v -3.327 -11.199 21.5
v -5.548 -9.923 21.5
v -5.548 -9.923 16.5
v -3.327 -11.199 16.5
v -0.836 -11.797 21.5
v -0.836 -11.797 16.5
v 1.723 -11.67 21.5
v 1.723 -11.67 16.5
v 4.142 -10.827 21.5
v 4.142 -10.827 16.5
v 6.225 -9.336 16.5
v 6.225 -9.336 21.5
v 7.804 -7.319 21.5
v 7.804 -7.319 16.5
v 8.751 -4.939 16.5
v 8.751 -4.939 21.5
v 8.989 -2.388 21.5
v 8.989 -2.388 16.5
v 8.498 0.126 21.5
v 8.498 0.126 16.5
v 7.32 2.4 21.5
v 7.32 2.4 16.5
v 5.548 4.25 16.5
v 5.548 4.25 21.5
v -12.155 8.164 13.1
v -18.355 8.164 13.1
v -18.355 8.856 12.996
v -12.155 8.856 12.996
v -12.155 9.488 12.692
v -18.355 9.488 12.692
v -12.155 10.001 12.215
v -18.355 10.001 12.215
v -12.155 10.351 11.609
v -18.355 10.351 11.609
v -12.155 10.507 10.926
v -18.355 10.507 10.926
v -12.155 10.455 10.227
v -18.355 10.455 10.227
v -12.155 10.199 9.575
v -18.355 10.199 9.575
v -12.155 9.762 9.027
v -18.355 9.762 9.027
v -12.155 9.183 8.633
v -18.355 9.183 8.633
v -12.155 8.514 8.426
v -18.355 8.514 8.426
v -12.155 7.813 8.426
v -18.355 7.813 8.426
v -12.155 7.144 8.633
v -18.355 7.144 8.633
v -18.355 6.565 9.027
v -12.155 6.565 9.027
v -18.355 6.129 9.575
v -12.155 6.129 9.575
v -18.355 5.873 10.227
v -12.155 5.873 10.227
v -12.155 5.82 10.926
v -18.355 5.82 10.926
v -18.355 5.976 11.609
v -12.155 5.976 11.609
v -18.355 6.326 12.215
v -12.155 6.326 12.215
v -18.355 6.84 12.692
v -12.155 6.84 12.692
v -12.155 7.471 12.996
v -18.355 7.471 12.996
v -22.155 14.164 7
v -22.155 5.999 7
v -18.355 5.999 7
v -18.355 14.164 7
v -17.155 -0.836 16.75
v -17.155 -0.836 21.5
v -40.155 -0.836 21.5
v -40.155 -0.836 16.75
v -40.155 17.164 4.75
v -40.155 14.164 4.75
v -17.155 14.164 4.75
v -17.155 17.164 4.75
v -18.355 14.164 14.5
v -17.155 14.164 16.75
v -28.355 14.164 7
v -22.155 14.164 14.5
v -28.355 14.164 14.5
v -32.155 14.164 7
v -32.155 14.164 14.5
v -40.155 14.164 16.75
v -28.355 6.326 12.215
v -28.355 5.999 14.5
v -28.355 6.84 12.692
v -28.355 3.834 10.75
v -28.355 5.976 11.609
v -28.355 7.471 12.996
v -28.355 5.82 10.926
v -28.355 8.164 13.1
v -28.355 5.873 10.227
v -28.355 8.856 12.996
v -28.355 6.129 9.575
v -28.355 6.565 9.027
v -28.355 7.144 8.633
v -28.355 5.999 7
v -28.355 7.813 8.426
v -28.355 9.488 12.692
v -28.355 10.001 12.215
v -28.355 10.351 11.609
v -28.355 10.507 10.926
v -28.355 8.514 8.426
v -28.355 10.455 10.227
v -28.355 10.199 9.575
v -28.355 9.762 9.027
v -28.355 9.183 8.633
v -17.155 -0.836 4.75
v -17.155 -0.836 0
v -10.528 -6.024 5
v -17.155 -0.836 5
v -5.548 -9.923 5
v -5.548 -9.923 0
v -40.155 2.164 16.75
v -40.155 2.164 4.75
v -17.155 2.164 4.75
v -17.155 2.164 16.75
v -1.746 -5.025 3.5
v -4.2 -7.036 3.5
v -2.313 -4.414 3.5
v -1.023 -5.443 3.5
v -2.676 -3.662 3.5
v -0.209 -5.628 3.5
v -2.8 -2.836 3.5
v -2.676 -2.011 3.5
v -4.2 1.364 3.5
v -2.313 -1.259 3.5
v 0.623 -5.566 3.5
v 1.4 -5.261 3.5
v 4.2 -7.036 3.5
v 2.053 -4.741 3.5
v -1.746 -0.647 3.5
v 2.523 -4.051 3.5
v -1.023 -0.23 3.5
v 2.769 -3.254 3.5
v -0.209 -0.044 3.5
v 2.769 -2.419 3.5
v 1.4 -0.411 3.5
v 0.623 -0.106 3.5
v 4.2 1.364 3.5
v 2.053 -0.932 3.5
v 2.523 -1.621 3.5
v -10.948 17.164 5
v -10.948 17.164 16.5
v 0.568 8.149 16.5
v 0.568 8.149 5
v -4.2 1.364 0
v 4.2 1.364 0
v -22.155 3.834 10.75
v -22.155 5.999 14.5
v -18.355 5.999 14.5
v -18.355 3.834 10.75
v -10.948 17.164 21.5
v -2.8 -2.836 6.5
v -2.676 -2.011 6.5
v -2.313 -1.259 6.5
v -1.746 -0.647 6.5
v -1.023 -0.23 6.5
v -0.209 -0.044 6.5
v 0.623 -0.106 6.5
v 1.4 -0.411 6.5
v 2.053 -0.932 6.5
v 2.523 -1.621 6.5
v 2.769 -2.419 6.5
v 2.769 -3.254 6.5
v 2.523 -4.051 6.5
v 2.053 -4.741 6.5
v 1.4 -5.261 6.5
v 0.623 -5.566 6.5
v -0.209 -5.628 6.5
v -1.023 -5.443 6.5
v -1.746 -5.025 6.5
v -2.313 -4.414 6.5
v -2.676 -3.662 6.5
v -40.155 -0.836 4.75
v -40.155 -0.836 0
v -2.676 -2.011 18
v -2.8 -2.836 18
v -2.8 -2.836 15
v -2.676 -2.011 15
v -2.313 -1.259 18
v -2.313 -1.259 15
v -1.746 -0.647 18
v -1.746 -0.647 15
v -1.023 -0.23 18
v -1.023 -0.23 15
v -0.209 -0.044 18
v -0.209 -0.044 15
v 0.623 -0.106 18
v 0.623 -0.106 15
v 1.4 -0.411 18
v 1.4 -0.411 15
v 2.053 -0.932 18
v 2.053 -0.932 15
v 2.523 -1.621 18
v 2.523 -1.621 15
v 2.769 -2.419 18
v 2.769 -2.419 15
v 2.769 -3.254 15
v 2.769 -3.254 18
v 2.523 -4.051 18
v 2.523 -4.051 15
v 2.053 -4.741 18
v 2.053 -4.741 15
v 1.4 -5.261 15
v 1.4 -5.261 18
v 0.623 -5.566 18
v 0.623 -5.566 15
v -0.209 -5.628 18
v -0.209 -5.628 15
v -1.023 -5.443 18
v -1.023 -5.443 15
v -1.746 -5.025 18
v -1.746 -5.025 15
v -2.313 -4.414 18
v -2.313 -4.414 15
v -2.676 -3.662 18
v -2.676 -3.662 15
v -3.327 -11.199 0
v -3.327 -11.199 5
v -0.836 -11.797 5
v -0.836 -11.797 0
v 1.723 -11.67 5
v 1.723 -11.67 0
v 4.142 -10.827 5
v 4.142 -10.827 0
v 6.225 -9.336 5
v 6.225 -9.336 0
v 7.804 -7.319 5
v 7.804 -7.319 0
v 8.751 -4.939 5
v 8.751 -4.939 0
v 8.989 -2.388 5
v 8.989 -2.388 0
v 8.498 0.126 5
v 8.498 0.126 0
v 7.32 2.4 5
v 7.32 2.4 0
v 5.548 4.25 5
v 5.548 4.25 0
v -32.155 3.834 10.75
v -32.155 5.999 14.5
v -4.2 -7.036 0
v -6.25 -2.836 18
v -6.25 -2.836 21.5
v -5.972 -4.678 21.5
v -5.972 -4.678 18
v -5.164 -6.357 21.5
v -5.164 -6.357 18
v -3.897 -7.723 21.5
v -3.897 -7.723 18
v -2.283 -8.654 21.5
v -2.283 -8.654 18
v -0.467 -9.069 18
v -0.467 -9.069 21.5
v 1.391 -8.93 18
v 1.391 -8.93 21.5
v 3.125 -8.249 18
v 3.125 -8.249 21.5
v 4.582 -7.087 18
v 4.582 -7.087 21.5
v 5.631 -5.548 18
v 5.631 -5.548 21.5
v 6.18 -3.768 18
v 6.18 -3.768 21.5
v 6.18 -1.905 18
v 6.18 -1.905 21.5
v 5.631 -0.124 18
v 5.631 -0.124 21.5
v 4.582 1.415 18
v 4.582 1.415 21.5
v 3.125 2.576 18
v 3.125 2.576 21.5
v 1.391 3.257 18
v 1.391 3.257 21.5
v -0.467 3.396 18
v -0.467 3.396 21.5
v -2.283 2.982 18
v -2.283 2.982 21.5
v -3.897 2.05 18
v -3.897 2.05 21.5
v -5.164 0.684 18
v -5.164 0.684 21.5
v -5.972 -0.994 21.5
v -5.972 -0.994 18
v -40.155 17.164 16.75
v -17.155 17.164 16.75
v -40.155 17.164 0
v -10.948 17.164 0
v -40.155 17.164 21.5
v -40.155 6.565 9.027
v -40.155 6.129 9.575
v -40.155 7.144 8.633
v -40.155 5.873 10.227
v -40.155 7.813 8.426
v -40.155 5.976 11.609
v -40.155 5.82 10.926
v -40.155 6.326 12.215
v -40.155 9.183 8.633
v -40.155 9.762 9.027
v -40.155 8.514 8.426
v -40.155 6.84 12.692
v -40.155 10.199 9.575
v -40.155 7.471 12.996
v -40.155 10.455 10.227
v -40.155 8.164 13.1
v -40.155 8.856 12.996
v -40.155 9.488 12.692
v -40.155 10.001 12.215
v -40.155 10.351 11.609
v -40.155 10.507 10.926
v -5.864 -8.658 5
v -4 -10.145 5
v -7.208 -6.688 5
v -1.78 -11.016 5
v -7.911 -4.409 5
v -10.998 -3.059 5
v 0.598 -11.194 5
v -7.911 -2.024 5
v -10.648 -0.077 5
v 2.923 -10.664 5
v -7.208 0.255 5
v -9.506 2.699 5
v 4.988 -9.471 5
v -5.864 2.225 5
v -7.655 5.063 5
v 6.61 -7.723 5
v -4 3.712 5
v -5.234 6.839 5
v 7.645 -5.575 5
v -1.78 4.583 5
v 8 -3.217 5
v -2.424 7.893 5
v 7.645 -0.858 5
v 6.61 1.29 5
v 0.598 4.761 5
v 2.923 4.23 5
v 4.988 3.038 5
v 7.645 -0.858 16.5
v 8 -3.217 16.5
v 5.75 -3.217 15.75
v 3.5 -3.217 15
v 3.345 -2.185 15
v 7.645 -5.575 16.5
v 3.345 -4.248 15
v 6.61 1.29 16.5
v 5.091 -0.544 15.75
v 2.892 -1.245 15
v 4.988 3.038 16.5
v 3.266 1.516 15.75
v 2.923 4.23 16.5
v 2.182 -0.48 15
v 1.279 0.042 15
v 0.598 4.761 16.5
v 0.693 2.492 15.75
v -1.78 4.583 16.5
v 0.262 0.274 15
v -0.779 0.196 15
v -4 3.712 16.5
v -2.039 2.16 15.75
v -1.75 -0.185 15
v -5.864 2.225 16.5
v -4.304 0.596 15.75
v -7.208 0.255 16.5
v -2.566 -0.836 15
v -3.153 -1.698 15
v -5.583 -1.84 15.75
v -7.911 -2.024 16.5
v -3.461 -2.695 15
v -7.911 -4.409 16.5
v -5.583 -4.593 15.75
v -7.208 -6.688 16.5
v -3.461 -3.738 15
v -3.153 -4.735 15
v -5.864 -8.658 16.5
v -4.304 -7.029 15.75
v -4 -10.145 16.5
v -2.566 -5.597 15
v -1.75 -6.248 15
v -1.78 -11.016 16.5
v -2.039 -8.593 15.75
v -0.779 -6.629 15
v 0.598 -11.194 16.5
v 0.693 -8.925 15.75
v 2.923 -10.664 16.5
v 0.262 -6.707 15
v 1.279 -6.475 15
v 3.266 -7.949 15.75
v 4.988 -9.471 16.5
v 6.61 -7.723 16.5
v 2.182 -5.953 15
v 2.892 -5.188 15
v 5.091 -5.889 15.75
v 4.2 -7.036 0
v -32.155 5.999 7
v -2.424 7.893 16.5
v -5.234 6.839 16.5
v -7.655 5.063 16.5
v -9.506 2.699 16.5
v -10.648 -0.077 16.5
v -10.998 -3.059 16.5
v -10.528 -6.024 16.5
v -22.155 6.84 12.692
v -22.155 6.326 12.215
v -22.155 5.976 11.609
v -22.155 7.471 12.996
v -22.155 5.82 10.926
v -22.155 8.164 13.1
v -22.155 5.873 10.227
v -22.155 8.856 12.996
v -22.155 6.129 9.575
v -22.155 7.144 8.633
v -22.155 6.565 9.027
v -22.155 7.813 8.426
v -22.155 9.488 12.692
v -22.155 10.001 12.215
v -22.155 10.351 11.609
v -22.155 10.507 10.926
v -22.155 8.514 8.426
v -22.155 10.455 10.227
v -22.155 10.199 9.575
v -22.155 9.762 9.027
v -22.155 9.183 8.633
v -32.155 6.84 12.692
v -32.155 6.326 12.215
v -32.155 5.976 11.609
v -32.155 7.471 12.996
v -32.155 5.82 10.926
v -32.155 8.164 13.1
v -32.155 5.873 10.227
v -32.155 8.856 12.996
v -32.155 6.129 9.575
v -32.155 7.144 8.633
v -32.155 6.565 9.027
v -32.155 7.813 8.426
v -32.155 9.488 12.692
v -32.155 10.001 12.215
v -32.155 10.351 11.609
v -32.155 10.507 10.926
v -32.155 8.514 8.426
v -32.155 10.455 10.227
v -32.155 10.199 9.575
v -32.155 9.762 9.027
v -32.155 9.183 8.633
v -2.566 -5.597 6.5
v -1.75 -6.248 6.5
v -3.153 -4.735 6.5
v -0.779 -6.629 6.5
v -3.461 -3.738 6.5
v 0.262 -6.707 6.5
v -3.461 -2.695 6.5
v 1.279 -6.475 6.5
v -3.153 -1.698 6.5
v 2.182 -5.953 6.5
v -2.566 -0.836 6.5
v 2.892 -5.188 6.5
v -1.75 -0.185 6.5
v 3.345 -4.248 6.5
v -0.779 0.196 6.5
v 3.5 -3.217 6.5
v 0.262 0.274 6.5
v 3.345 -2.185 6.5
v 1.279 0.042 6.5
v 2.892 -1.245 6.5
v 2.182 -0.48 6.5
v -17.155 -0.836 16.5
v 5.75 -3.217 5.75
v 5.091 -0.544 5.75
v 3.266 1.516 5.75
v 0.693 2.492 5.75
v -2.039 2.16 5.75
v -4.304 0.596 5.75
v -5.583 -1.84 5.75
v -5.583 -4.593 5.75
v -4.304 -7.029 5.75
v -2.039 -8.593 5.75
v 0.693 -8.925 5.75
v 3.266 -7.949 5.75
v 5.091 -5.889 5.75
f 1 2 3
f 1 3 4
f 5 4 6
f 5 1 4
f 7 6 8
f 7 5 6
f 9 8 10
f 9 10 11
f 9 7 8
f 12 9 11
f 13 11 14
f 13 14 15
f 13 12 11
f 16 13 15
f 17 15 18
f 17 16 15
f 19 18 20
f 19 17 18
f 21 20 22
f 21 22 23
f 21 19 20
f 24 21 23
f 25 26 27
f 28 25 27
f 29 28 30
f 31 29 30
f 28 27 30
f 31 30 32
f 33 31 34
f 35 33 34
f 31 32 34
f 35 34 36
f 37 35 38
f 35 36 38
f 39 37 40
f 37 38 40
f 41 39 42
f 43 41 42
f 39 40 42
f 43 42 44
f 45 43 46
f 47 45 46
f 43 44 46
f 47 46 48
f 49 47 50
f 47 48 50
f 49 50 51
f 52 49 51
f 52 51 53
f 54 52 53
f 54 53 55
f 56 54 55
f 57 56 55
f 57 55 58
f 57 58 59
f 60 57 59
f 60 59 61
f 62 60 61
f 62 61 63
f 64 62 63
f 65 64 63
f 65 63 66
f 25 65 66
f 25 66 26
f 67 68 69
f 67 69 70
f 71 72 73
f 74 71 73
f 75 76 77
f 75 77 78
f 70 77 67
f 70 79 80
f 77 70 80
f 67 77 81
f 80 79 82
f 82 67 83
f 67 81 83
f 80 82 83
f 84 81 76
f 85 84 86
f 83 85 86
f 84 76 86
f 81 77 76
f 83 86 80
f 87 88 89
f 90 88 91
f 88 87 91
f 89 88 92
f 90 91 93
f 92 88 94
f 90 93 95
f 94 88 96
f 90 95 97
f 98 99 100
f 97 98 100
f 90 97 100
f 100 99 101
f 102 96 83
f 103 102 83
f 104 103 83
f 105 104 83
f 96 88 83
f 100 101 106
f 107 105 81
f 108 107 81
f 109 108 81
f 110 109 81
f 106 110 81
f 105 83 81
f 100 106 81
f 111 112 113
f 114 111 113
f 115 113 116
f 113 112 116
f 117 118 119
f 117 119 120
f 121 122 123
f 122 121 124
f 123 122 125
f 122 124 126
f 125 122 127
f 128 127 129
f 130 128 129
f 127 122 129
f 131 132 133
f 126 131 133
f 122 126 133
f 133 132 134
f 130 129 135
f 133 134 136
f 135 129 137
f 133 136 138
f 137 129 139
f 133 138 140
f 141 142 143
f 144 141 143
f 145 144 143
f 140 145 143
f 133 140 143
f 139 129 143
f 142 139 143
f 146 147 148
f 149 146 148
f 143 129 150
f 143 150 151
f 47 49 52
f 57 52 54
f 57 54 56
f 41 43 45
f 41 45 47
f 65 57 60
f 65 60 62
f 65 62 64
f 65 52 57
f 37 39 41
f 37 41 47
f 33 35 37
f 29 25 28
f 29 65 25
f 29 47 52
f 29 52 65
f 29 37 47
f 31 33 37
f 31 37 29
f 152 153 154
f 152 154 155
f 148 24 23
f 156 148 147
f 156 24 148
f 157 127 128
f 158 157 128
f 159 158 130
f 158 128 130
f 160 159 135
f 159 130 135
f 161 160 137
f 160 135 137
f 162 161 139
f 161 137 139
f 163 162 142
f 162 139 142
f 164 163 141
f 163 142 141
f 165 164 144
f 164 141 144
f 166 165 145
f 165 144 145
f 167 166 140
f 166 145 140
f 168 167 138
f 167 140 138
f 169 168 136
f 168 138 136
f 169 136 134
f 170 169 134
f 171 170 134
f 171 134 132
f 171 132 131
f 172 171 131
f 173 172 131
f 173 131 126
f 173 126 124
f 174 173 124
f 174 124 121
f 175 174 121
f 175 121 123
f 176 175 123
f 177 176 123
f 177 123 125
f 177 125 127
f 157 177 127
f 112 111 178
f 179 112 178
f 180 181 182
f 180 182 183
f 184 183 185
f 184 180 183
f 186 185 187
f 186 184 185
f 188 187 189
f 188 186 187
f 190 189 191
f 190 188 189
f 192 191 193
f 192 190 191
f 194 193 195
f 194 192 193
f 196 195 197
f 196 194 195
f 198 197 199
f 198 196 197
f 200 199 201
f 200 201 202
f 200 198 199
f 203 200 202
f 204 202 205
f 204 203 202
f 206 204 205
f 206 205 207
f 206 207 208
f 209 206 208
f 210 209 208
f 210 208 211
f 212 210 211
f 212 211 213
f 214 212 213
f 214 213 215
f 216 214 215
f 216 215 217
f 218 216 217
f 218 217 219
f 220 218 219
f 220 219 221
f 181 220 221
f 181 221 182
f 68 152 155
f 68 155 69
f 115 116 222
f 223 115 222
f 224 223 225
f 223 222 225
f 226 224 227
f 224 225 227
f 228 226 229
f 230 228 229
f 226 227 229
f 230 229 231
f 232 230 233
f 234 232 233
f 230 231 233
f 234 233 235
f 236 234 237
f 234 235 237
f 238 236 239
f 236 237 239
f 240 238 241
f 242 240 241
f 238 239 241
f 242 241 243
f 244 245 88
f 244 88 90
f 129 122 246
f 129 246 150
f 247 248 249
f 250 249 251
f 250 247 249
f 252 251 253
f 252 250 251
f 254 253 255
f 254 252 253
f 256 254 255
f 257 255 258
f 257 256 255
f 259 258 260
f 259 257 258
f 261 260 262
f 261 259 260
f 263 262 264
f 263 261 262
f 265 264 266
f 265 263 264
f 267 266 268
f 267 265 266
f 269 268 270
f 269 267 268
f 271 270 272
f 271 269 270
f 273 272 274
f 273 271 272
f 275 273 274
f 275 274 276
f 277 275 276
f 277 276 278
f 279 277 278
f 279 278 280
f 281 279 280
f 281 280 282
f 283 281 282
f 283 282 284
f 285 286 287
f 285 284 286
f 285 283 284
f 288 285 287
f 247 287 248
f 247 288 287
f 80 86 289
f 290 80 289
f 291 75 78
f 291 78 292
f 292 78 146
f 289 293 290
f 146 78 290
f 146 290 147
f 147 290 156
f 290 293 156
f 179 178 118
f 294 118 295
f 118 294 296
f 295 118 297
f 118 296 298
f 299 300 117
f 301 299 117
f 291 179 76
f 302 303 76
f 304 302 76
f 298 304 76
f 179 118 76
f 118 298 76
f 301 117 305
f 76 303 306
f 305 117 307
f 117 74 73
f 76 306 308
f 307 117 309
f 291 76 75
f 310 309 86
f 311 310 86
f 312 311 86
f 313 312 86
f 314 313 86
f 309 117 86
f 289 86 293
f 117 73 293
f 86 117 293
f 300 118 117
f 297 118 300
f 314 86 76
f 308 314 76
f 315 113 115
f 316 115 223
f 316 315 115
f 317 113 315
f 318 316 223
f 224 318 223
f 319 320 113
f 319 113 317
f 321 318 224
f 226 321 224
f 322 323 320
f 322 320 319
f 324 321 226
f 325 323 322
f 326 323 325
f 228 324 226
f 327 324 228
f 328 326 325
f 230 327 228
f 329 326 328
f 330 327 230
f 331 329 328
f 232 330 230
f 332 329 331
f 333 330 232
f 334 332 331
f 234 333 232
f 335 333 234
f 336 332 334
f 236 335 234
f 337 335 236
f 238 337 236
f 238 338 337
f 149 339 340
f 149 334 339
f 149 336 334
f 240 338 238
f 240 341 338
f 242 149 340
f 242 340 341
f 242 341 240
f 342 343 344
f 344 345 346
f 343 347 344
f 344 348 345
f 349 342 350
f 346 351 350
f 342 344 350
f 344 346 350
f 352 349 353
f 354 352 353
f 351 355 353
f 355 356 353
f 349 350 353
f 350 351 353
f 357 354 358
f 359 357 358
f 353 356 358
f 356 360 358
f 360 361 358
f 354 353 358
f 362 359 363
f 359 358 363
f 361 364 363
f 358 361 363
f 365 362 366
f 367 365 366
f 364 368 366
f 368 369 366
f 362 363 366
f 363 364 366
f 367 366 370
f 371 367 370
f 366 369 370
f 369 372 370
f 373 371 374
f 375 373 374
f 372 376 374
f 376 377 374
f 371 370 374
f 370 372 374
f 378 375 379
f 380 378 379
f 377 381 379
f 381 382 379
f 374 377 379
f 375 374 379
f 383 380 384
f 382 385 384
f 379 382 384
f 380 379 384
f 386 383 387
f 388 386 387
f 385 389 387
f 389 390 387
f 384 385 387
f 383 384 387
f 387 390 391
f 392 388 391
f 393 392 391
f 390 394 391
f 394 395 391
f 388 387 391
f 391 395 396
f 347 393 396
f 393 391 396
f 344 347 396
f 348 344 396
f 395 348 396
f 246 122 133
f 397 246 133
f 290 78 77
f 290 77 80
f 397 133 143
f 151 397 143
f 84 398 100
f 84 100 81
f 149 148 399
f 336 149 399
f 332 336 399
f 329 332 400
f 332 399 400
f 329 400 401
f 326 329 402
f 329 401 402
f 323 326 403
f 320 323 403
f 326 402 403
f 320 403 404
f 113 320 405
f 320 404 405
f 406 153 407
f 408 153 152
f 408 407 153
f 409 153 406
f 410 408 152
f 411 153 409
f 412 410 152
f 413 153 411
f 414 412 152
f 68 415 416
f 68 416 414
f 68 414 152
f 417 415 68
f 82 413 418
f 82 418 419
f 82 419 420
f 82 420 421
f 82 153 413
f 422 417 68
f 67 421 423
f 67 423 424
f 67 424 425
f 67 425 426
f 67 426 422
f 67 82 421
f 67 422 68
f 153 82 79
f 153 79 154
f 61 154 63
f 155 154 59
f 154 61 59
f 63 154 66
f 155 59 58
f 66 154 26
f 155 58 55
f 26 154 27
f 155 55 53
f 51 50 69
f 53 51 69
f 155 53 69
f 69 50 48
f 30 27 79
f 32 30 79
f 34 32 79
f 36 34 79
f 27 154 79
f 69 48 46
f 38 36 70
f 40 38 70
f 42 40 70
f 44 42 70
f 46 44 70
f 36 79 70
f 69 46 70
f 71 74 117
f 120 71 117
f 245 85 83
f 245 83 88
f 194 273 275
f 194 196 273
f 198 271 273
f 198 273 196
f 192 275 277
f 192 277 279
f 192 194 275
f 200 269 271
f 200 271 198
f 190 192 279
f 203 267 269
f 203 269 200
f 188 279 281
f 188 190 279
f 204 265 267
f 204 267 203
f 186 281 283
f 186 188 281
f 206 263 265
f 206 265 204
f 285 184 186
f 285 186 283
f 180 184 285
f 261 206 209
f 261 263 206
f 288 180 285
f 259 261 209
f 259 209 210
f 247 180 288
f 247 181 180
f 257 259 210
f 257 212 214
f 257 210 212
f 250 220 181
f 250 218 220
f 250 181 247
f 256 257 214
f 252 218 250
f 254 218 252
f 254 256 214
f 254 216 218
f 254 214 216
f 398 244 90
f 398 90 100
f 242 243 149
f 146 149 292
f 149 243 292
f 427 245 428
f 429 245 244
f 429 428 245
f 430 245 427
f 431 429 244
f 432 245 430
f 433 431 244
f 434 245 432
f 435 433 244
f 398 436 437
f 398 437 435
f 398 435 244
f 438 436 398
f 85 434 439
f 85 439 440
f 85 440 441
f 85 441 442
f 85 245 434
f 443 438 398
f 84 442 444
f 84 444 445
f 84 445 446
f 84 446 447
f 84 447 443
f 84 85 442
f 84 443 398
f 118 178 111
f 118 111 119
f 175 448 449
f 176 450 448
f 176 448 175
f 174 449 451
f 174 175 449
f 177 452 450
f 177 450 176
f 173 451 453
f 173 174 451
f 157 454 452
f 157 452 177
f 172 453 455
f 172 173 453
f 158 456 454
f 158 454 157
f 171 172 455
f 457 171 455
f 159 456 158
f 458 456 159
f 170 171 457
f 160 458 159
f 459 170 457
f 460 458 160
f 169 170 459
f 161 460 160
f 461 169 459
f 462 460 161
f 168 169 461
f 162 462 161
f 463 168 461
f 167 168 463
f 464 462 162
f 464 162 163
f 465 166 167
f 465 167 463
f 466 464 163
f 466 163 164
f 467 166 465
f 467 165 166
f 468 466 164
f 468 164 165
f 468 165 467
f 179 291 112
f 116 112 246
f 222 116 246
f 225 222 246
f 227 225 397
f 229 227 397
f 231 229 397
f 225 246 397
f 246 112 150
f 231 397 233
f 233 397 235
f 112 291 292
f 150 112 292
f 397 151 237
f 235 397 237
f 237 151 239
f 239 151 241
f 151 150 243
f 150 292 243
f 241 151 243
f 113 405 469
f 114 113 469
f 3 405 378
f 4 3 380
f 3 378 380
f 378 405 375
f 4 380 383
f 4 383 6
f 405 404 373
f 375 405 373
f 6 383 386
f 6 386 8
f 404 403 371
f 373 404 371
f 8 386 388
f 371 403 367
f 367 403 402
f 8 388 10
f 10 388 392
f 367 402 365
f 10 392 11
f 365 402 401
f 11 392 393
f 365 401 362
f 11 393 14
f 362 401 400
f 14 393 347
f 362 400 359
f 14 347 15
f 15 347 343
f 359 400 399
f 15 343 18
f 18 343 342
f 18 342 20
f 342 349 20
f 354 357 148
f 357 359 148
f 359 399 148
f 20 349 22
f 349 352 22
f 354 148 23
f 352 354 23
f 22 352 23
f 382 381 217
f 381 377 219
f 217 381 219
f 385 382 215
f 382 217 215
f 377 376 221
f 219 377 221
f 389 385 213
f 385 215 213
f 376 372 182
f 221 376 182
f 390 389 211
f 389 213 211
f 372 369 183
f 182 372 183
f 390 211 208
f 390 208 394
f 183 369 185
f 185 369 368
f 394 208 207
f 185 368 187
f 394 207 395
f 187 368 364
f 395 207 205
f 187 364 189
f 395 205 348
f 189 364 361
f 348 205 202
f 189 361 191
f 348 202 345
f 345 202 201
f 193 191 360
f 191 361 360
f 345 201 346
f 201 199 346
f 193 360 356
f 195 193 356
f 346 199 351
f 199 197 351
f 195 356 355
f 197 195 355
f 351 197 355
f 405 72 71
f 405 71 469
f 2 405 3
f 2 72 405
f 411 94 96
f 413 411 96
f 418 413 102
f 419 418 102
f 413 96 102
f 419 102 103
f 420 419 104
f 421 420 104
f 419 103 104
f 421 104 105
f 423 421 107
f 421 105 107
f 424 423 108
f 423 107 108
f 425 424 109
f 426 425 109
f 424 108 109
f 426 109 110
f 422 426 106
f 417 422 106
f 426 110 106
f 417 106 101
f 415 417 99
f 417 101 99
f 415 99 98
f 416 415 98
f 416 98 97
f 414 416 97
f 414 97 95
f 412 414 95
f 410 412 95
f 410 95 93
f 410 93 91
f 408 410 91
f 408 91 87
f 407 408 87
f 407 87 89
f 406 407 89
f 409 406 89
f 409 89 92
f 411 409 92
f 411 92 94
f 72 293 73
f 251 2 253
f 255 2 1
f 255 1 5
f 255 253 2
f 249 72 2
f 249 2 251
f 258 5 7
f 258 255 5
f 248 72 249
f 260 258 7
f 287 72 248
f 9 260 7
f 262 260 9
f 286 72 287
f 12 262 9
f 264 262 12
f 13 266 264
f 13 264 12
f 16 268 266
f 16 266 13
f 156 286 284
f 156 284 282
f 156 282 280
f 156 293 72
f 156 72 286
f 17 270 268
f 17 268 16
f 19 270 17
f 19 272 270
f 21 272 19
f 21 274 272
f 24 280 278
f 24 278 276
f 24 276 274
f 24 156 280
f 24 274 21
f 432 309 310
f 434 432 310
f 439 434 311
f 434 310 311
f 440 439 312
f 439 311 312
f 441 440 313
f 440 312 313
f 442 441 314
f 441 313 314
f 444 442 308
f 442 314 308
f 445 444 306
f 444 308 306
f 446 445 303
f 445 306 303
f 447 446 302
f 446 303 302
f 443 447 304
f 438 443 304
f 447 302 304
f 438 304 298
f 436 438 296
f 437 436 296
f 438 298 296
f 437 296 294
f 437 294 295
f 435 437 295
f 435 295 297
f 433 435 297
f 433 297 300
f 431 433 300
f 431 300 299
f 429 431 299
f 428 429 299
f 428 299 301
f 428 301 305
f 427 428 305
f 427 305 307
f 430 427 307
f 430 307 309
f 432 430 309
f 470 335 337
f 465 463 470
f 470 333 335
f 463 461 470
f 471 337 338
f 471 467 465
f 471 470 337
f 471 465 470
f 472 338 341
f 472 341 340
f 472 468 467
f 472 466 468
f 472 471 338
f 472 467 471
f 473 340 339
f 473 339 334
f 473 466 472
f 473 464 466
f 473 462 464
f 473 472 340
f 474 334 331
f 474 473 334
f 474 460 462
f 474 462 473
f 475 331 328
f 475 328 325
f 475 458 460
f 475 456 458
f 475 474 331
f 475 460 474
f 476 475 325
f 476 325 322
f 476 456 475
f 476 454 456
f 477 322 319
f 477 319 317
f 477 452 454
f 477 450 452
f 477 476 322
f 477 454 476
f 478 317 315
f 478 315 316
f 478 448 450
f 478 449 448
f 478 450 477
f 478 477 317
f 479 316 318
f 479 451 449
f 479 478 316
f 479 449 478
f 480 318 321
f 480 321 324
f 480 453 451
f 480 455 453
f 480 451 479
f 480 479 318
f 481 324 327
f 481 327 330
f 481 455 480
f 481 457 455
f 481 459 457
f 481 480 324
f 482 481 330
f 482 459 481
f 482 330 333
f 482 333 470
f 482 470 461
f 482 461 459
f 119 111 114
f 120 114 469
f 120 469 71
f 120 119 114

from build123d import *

# Parameters (mm, degrees)
BOSS_EXTRUDE1_DEPTH = 5
SKETCH8_R           = 3.5
BOSS_EXTRUDE5_DEPTH = 1.5
SKETCH10_R          = 8
BOSS_EXTRUDE7_DEPTH = 5.75
SKETCH15_R          = 2.8
CUT_EXTRUDE7_DEPTH  = 10
NUT_CUT_START       = -1.5
SKETCH6_W           = 8.4
SKETCH6_H           = 8.4
NUT_CUT_DEPTH       = 46.182751545
SKETCH16_W          = 12
SKETCH16_H          = 3
CUT_EXTRUDE8_DEPTH  = 23
SKETCH17_R          = 2.35
CUT_EXTRUDE9_DEPTH  = 28
CUT_EXTRUDE10_START = 1.5
SKETCH19_R          = 6.25
CUT_EXTRUDE10_DEPTH = 46.182751545
CUT_EXTRUDE11_START = -8
CUT_EXTRUDE11_DEPTH = 3.8
LPATTERN1_COUNT     = 2
LPATTERN1_PITCH     = 10


with BuildPart() as part:
    # Sketch1 → Boss-Extrude1 (new body)
    with BuildSketch(Plane.XY):
        with BuildLine():
            Line((-40.155138696, -0.836255417), (-17.155138696, -0.836255417))
            Line((-17.155138696, -0.836255417), (-5.547811002, -9.922989015))
            ThreePointArc((-5.547811002, -9.922989015), (7.086733598, -8.384066419), (5.547811002, 4.250478181))
            Line((5.547811002, 4.250478181), (-10.947501986, 17.163744583))
            Line((-10.947501986, 17.163744583), (-40.155138696, 17.163744583))
            Line((-40.155138696, 17.163744583), (-40.155138696, -0.836255417))
        make_face()
    extrude(amount=BOSS_EXTRUDE1_DEPTH)

    # Sketch8 → Boss-Extrude5 (add)
    with BuildSketch(Plane.XY.offset(5)):
        with Locations((0, -3.216528208)):
            Circle(SKETCH8_R)
    extrude(amount=BOSS_EXTRUDE5_DEPTH)

    # Sketch10 → section 0 of loft4
    with BuildSketch(Plane.XY.offset(5), mode=Mode.PRIVATE) as loft4_s0:
        with Locations((0, -3.216528208)):
            Circle(SKETCH10_R)
    # loft up to a face of the part (loft4)
    loft([loft4_s0.sketch, part.faces().sort_by_distance((0, -3.216528208, 6.5))[0]])

    # Sketch14 → Boss-Extrude7 (add)
    with BuildSketch(Plane.XY.offset(5)):
        with BuildLine():
            Line((-40.155138696, -0.836255417), (-40.155138696, 17.163744583))
            Line((-40.155138696, 17.163744583), (-10.947501986, 17.163744583))
            Line((-10.947501986, 17.163744583), (0.567762259, 8.149082357))
            ThreePointArc((0.567762259, 8.149082357), (-8.661563286, 3.944402474), (-10.527859744, -6.024384839))
            Line((-10.527859744, -6.024384839), (-17.155138696, -0.836255417))
            Line((-17.155138696, -0.836255417), (-40.155138696, -0.836255417))
        make_face()
    extrude(amount=BOSS_EXTRUDE7_DEPTH)

    # Sketch15 → Cut-Extrude7 (cut)
    with BuildSketch(Plane(origin=(0, 0, 0), x_dir=(-1, 0, 0), z_dir=(0, 0, -1))):
        with Locations((0, -2.836255417)):
            Circle(SKETCH15_R)
    extrude(amount=-CUT_EXTRUDE7_DEPTH, mode=Mode.SUBTRACT)

    # Mirror1: part across plane


with BuildPart() as part_1:
    add(part.part)
    add(part.part.mirror(Plane(origin=(0, -2.836255417, 10.75), x_dir=(1, 0, 0), z_dir=(0, 0, 1))))

    # Sketch6 → nut-cut (cut, through all)
    with BuildSketch(Plane.XY.offset(5).offset(NUT_CUT_START)):
        with Locations((0, -2.836255417)):
            Rectangle(SKETCH6_W, SKETCH6_H)
    extrude(amount=-NUT_CUT_DEPTH, mode=Mode.SUBTRACT)

    # Sketch16 → Cut-Extrude8 (cut)
    with BuildSketch(Plane.ZY.offset(40.155138696)):
        with Locations((10.75, 0.663744583)):
            Rectangle(SKETCH16_W, SKETCH16_H)
        with Locations((10.75, 15.663744583)):
            Rectangle(SKETCH16_W, SKETCH16_H)
    extrude(amount=-CUT_EXTRUDE8_DEPTH, mode=Mode.SUBTRACT)

    # Sketch17 → Cut-Extrude9 (cut)
    with BuildSketch(Plane.ZY.offset(40.155138696)):
        with Locations((10.75, 8.163744583)):
            Circle(SKETCH17_R)
    extrude(amount=-CUT_EXTRUDE9_DEPTH, mode=Mode.SUBTRACT)

    # Sketch19 → Cut-Extrude10 (cut, through all)
    with BuildSketch(Plane.XY.offset(16.5).offset(CUT_EXTRUDE10_START)):
        with Locations(Location((0, -2.836255417, 0), (0, 0, 180))):
            Circle(SKETCH19_R)
    extrude(amount=CUT_EXTRUDE10_DEPTH, mode=Mode.SUBTRACT)

    # Sketch20 → Cut-Extrude11 (cut)
    with BuildSketch(Plane.ZY.offset(40.155138696).offset(CUT_EXTRUDE11_START)):
        Polygon((7, 14.163744583), (14.5, 14.163744583), (14.5, 5.998681073), (10.75, 3.833617564), (7, 5.998681073), align=None)
    cut_extrude11 = extrude(amount=-CUT_EXTRUDE11_DEPTH, mode=Mode.SUBTRACT)

    # LPattern1: Cut-Extrude11 ×2
    with Locations(*[(i * LPATTERN1_PITCH, 0, 0) for i in range(1, LPATTERN1_COUNT)]):
        add(cut_extrude11, mode=Mode.SUBTRACT)


solid = part_1.part
